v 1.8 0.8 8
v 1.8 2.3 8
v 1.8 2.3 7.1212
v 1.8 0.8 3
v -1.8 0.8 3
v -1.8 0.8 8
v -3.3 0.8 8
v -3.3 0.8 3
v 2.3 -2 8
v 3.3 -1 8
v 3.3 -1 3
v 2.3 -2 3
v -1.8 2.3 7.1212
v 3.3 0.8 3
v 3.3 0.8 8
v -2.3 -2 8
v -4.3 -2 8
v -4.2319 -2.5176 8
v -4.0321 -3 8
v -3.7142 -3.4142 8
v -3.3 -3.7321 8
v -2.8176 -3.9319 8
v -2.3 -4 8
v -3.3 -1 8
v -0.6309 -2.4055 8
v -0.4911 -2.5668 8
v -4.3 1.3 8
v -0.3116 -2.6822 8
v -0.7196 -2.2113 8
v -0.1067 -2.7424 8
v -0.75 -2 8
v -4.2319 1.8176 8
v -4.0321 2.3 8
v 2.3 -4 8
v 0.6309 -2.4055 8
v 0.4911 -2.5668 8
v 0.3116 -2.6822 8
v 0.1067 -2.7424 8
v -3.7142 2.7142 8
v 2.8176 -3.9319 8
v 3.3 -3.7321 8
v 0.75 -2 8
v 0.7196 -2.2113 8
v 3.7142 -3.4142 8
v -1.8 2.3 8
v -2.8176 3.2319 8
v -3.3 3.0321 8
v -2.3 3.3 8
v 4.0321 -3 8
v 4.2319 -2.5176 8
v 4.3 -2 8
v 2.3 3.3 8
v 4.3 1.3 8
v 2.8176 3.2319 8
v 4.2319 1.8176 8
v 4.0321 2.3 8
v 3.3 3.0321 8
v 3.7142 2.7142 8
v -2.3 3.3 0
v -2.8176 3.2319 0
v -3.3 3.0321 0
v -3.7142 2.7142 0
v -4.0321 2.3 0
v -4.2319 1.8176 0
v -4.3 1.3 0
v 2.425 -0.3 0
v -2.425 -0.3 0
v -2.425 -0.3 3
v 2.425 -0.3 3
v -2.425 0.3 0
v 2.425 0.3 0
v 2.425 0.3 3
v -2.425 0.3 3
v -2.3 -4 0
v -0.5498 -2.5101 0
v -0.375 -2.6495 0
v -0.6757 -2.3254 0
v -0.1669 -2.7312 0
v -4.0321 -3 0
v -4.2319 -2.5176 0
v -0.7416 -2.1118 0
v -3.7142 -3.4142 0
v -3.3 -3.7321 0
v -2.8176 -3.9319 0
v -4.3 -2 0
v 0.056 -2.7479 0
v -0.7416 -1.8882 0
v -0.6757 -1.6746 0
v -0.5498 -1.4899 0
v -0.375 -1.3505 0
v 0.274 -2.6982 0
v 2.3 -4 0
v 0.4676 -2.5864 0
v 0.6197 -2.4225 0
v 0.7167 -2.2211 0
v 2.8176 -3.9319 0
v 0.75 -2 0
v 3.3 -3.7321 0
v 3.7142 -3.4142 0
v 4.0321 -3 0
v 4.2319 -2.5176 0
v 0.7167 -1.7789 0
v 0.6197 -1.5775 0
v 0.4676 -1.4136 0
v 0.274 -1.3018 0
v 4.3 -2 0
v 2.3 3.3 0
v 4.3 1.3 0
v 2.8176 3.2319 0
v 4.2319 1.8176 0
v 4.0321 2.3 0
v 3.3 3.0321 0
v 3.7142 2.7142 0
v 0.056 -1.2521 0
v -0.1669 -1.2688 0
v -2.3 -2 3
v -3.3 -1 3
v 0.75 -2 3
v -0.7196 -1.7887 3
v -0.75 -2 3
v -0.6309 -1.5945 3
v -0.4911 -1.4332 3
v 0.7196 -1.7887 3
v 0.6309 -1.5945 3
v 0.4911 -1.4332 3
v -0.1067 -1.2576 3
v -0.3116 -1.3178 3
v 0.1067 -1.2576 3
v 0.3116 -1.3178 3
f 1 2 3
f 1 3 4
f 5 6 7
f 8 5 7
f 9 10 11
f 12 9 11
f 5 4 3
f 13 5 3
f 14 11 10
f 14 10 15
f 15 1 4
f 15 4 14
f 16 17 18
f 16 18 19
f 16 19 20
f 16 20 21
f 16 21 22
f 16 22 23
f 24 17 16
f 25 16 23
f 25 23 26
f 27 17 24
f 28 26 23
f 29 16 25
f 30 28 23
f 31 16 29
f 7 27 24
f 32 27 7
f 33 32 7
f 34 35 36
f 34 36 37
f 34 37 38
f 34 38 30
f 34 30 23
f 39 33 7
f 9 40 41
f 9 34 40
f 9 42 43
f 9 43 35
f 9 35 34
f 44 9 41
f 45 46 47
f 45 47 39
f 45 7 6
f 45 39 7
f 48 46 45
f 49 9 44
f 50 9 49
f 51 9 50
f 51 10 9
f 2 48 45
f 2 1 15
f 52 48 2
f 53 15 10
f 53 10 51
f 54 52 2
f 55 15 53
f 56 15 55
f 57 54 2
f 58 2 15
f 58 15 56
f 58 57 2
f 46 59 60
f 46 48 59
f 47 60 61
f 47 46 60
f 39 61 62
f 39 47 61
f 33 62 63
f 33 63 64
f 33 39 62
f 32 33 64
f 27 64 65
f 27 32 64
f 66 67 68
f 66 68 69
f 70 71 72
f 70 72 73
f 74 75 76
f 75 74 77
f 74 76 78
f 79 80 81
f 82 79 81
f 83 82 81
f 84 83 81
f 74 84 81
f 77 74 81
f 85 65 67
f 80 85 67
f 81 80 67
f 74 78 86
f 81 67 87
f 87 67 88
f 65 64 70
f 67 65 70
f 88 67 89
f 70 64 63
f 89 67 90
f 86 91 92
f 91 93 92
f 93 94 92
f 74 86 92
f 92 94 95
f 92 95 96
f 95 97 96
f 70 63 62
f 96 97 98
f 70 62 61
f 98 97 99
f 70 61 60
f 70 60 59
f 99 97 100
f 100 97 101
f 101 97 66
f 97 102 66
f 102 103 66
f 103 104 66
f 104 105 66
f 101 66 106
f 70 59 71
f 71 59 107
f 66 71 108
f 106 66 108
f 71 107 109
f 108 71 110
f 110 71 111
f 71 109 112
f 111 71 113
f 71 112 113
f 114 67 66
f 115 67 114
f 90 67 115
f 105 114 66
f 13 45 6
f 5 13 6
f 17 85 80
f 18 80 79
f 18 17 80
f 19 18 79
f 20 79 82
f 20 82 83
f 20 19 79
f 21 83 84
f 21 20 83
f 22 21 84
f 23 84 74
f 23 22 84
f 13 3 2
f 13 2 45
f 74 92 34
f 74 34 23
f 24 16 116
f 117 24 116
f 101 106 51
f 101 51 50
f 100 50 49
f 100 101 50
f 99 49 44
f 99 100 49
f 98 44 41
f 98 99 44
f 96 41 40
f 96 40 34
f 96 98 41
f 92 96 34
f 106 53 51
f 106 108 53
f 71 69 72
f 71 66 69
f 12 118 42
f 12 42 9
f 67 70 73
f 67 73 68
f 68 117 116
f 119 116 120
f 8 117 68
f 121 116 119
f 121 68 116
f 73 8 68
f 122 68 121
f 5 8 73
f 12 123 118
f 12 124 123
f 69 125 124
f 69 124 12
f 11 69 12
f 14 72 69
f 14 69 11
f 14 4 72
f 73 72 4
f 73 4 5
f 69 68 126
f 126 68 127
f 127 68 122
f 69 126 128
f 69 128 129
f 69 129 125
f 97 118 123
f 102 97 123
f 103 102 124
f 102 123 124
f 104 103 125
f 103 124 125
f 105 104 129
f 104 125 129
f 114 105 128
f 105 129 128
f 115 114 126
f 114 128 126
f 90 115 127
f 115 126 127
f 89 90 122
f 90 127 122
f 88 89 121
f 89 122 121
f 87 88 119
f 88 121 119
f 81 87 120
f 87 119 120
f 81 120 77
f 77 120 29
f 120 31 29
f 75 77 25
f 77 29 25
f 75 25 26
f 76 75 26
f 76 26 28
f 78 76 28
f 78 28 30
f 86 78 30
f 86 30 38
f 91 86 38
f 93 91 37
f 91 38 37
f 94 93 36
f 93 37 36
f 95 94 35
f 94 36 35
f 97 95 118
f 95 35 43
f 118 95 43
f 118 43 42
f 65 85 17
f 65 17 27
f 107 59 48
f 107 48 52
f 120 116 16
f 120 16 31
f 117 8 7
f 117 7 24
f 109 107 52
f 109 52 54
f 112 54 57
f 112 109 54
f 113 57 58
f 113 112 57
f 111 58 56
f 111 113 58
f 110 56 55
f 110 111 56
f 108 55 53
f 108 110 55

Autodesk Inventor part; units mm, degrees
ref_plane "YZ Plane" through (0, 0, 0) normal (1, 0, 0) x (0, 1, 0)
ref_plane "XZ Plane" through (0, 0, 0) normal (0, 1, 0) x (-1, 0, 0)
ref_plane "XY Plane" through (0, 0, 0) normal (0, 0, 1) x (1, 0, 0)
sketch "Sketch1" plane through (0, 0, 0) normal (0, 0, 1) x (1, 0, 0)
  line L0 (-2.425, -0.3) -> (2.425, -0.3)
  line L1 (2.425, -0.3) -> (2.425, 0.3)
  line L2 (2.425, 0.3) -> (-2.425, 0.3)
  line L3 (-2.425, 0.3) -> (-2.425, -0.3)
  line L4 (-2.425, -0.3) -> (2.425, 0.3) construction
  line L5 (2.425, -0.3) -> (-2.425, 0.3) construction
  line L6 (-3.3, -2) -> (3.3, -2)
  line L7 (3.3, -2) -> (3.3, 2)
  line L8 (3.3, 2) -> (-3.3, 2)
  line L9 (-3.3, 2) -> (-3.3, -2)
  line L10 (-3.3, -2) -> (3.3, 2) construction
  line L11 (3.3, -2) -> (-3.3, 2) construction
  line L12 (-3.3, 0) -> (3.3, 0)
  line L13 (3.3, 0) -> (3.3, 2.3)
  line L14 (3.3, 2.3) -> (-3.3, 2.3)
  line L15 (-3.3, 2.3) -> (-3.3, 0)
  line L16 (-4.3, 3.3) -> (4.3, 3.3)
  line L17 (4.3, 3.3) -> (4.3, -4)
  line L18 (4.3, -4) -> (-4.3, -4)
  line L19 (-4.3, -4) -> (-4.3, 3.3)
  point P0 (0, 0)
  point P1 (-3.3, 2)
  point P2 (3.3, 2)
  dimension "d0" = 0.6
  dimension "d1" = 4.85
  dimension "d4" = 6.6
  dimension "d6" = 2
  dimension "d9" = 1
  dimension "d10" = 1
  dimension "d11" = 1
  dimension "d12" = 2
  dimension "d20" = 2
extrude "Extrusion1" add sketch "Sketch1" along normal blind 3 contours L0 L1 L12 L7 L6 L9 L3 | L12 L9 L8 L7 L1 L2 L3 | L15 L14 L13 L8 | L16 L17 L18 L19
extrude "Extrusion2" add sketch "Sketch1" along normal blind 8
sketch "Sketch2" plane through (3.3, -2, 3) normal (-1, 0, 0) x (0, 0, 1)
  line L0 (0, 0) -> (0, 4.3) projected
  line L1 (0, 0) -> (5, 0) projected
  line L2 (5, 4.3) -> (5, 0) projected
  line L3 (0, 4.3) -> (5, 4.3) projected
  line L4 (0, 0) -> (0, 4.3) projected
  line L5 (0, 2.8) -> (4.1212, 4.3)
  line L6 (0, 4.3) -> (5, 4.3) projected
  point P0 (-3, 2)
  point P1 (0, 2.3)
  dimension "d22" = 0.5
  dimension "d23" = 70
extrude "Extrusion3" add sketch "Sketch2" along normal blind 7 contours L0 L3 L5
sketch "Sketch3" plane through (0, 0, 8) normal (0, 0, 1) x (1, 0, 0)
  line L0 (-4.3, -4) -> (4.3, -4) projected
  line L1 (4.3, -4) -> (4.3, 3.3) projected
  line L2 (4.3, 3.3) -> (-4.3, 3.3) projected
  line L3 (-4.3, 3.3) -> (-4.3, -4) projected
  line L4 (3.3, -2) -> (-3.3, -2) projected
  line L5 (-3.3, -2) -> (-3.3, 2.3) projected
  line L6 (-3.3, 2.3) -> (3.3, 2.3) projected
  line L7 (3.3, 2.3) -> (3.3, -2) projected
  line L8 (-3.3, 2.3) -> (-1.8, 2.3)
  line L9 (-1.8, 2.3) -> (-1.8, 0.8)
  line L10 (-1.8, 0.8) -> (-3.3, 0.8)
  line L11 (-3.3, 0.8) -> (-3.3, 2.3)
  line L12 (3.3, 2.3) -> (1.8, 2.3)
  line L13 (1.8, 2.3) -> (1.8, 0.8)
  line L14 (1.8, 0.8) -> (3.3, 0.8)
  line L15 (3.3, 0.8) -> (3.3, 2.3)
  point P0 (0, 0)
  point P1 (-3.3, 0.8)
  point P2 (-1.8, 2.3)
  dimension "d26" = 1.5
  dimension "d27" = 1.5
  dimension "d28" = 1.5
  dimension "d29" = 1.5
extrude "Extrusion4" add sketch "Sketch3" against normal blind 5 contours L14 L13 L6 L7 | L5 L6 L9 L10
chamfer "Chamfer2" distance 1 angle 45 1 edges at (-3.3, -2, 5.5)
chamfer "Chamfer3" distance 1 angle 45 1 edges at (3.3, -2, 5.5)
sketch "Sketch4" plane through (0, 0, 8) normal (0, 0, 1) x (1, 0, 0)
  line L0 (-2.3, -2) -> (2.3, -2) projected
  circle A0 centre (0, -2) radius 0.75
  point P0 (0, 0)
  dimension "d39" = 1.5
extrude "Extrusion5" cut sketch "Sketch4" against normal blind 10
fillet "Fillet2" radius 2 4 edges at (-4.3, 3.3, 4) (4.3, 3.3, 4) (4.3, -4, 4) (-4.3, -4, 4)
properties part number "Cable_tie_connector_p1_metal"
